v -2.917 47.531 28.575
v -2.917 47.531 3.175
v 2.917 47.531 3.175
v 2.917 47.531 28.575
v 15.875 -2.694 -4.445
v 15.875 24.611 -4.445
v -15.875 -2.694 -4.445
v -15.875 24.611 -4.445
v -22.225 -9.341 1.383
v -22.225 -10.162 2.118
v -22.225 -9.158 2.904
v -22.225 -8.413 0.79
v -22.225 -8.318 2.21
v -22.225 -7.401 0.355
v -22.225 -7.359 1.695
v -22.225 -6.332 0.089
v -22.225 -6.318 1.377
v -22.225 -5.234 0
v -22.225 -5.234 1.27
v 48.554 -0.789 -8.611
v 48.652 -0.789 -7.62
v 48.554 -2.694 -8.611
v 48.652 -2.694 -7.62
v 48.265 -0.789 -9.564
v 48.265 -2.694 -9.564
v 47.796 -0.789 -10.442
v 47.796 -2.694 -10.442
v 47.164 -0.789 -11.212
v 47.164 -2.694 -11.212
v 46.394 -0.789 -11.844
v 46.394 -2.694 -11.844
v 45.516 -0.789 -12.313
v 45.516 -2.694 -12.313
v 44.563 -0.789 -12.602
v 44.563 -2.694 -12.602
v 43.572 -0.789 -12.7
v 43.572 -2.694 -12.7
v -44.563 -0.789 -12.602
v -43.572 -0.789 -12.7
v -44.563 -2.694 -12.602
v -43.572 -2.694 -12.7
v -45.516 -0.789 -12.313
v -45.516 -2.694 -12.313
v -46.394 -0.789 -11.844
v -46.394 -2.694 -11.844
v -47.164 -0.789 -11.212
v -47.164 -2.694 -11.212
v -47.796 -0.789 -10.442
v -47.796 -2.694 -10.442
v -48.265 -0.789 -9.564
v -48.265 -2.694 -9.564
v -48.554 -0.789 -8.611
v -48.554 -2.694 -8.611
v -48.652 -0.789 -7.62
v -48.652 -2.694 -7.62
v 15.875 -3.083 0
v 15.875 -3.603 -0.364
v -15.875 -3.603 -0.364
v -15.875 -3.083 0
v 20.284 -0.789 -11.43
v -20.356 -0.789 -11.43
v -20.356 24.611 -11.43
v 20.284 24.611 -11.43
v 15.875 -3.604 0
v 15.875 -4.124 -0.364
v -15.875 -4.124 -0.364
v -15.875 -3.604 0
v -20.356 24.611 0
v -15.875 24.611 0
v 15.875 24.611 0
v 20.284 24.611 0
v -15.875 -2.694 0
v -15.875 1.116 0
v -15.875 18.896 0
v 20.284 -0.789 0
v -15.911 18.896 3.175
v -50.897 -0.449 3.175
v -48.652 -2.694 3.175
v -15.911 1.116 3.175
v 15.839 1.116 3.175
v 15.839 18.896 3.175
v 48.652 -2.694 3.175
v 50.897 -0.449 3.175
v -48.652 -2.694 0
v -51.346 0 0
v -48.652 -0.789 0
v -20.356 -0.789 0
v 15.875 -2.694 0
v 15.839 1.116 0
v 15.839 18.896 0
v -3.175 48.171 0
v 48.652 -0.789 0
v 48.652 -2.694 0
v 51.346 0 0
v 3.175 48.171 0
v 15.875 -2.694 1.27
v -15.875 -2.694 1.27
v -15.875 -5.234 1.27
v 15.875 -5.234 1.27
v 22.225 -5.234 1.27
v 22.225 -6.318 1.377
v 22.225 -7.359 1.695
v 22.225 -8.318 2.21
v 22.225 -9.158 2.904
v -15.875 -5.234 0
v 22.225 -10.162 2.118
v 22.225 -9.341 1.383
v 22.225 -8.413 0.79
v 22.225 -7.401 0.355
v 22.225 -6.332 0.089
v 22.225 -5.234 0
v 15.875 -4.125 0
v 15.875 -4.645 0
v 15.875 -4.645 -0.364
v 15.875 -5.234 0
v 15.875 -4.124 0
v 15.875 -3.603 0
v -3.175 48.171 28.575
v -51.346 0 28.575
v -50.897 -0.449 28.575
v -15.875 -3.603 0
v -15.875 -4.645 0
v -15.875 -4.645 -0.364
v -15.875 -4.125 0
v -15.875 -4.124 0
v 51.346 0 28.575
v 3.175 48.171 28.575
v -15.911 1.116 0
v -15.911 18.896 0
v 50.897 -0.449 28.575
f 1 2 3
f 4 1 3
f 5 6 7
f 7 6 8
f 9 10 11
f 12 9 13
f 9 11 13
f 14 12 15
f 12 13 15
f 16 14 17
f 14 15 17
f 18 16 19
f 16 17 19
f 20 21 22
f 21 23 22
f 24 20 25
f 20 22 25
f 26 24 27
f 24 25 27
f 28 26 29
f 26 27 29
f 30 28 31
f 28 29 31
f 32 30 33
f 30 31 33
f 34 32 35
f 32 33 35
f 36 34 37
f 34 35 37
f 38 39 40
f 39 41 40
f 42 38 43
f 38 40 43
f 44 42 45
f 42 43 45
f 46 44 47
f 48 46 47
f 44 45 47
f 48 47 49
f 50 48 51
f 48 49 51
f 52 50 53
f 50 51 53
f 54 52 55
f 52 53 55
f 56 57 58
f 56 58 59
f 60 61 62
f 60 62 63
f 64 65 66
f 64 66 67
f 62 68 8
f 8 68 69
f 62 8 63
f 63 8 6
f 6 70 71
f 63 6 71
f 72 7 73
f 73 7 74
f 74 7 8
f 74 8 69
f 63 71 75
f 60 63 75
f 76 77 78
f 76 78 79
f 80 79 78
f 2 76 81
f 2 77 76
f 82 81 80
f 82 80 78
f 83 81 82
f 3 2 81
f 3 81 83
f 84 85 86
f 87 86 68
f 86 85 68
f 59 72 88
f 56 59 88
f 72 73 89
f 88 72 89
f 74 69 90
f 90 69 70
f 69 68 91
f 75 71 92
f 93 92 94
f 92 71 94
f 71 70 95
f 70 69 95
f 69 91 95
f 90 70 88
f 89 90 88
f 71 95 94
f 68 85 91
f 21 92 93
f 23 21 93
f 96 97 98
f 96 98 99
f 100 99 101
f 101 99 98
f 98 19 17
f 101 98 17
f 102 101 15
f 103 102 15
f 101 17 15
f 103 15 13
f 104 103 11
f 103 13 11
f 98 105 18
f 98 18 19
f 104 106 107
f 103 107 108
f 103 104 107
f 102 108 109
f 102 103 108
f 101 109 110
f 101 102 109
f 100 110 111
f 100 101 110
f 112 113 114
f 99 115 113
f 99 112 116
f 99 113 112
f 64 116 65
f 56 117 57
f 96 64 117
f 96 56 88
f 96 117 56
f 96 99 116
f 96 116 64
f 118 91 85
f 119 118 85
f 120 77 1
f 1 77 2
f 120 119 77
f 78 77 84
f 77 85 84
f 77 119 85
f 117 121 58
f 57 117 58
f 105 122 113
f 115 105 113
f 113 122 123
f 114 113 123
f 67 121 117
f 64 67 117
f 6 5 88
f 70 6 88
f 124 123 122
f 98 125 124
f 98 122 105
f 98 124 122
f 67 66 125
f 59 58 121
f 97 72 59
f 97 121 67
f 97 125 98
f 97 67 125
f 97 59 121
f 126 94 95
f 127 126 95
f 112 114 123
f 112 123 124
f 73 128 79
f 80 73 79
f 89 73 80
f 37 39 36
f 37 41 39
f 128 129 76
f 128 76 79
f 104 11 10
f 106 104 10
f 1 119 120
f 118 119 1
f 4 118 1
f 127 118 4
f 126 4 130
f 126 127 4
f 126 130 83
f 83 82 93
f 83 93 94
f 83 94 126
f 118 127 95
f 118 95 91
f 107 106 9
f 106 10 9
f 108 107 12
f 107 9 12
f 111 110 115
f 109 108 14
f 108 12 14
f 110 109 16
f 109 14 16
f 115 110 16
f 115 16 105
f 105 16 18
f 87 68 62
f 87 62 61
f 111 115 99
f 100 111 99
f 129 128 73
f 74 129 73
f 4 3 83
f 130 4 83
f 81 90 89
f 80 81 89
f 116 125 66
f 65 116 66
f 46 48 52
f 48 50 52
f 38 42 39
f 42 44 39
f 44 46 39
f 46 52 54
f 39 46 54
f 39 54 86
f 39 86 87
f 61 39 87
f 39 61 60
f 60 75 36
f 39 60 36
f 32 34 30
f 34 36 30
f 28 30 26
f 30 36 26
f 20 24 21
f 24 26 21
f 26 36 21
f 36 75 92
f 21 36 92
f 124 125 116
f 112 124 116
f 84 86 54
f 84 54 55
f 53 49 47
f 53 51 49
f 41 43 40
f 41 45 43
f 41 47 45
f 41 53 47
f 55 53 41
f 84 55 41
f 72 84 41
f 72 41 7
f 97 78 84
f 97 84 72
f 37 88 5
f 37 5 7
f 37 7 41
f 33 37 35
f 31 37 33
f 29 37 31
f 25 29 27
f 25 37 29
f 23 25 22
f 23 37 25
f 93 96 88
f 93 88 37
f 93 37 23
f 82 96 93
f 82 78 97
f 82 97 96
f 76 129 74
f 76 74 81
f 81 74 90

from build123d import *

# Parameters (mm, degrees)
F1_DEPTH         = 3.175
F3_DEPTH         = 25.4
F4_W             = 97.3040463274
F4_H             = 1.905
F5_DEPTH         = 12.7
F6_W             = 40.64
F6_H             = 25.4
F7_DEPTH         = 11.43
F8_W             = 31.75
F8_H             = 17.78
F9_DEPTH         = 3.175
F10_W            = 31.75
F10_H            = 4.445
F11_DEPTH        = 27.305
F12_W            = 31.75
F12_H            = 1.27
F13_DEPTH        = 2.54
F15_DEPTH        = 31.75
F15_COPIES_COUNT = 3
F15_COPIES_PITCH = 0.5207
F17_DEPTH        = 38.1
F18_DEPTH        = 6.35
F19_R            = 5.08


# Not quite as in the source:
# - a pattern or mirror of a feature is missing from the dataset's text; its kind, count and spacing are read off the source's solid


with BuildPart() as f1:
    # F0 (on Top) → F1 (new body)
    with BuildSketch(Plane.XY):
        Polygon((3.175, 48.1711), (-3.175, 48.1711), (-51.3461, 0), (-48.6520231637, -2.6940768363), (48.6520231637, -2.6940768363), (51.3461, 0), align=None)
    extrude(amount=F1_DEPTH)

    # F2 (on face) → F3 (join)
    with BuildSketch(Plane.XY.offset(3.175)):
        Polygon((-3.175, 48.1711), (-51.3461, 0), (-50.8970871939, -0.4490128061), (-2.916877582, 47.5311968059), (2.916871896, 47.5312024919), (50.8970871939, -0.4490128061), (51.3461, 0), (3.175, 48.1711), align=None)
    extrude(amount=F3_DEPTH)

    # F4 (on face) → F5 (join)
    with BuildSketch(Plane(origin=(0, 0, 0), x_dir=(1, 0, 0), z_dir=(0, 0, -1))):
        with Locations((0, 1.7415768363)):
            Rectangle(F4_W, F4_H)
    extrude(amount=F5_DEPTH)

    # F6 (on face) → F7 (join)
    with BuildSketch(Plane(origin=(0, 0, 0), x_dir=(1, 0, 0), z_dir=(0, 0, -1))):
        with Locations((-0.0357092768, -11.9109231637)):
            Rectangle(F6_W, F6_H)
    extrude(amount=F7_DEPTH)

    # F8 (on face) → F9 (cut, through all)
    with BuildSketch(Plane(origin=(0, 0, 0), x_dir=(1, 0, 0), z_dir=(0, 0, -1))):
        with Locations((-0.0357092768, -10.0059231637)):
            Rectangle(F8_W, F8_H)
    extrude(amount=-F9_DEPTH, mode=Mode.SUBTRACT)

    # F10 (on face) → F11 (cut, through all)
    with BuildSketch(Plane(origin=(0, 24.6109231637, 0), x_dir=(-1, 0, 0), z_dir=(0, 1, 0))):
        with Locations((-7.74733e-05, -2.2225)):
            Rectangle(F10_W, F10_H)
    extrude(amount=-F11_DEPTH, mode=Mode.SUBTRACT)

    # F12 (on face) → F13 (join)
    with BuildSketch(Plane.XZ.offset(2.6940768363)):
        with Locations((7.74733e-05, 0.635)):
            Rectangle(F12_W, F12_H)
    extrude(amount=F13_DEPTH)

    # F14 (on face) → F15 (join, through all)
    with BuildSketch(Plane.YZ.offset(15.8750774733)):
        Polygon((-3.6032828125, -0.3642210371), (-3.0831212644, 0), (-3.6032828125, 0), align=None)
    f15 = extrude(amount=-F15_DEPTH)

    # F15_copies: F15 ×3
    with Locations(*[(0, -i * F15_COPIES_PITCH, 0) for i in range(1, F15_COPIES_COUNT)]):
        add(f15)

    # F16 (on face) → F17 (join)
    with BuildSketch(Plane.YZ.offset(15.8750774733)):
        with BuildLine():
            Line((-9.1575253509, 2.9035897025), (-10.161578661, 2.1184348754))
            ThreePointArc((-10.161578661, 2.1184348754), (-7.9158691733, 0.5520507884), (-5.2340768363, 0))
            Line((-5.2340768363, 0), (-5.2340768363, 1.27))
            ThreePointArc((-5.2340768363, 1.27), (-7.3590511634, 1.6947115498), (-9.1575253509, 2.9035897025))
        make_face()
    extrude(amount=-F17_DEPTH)

    # F16 (on face) → F18 (join)
    with BuildSketch(Plane.YZ.offset(15.8750774733)):
        with BuildLine():
            Line((-9.1575253509, 2.9035897025), (-10.161578661, 2.1184348754))
            ThreePointArc((-10.161578661, 2.1184348754), (-7.9158691733, 0.5520507884), (-5.2340768363, 0))
            Line((-5.2340768363, 0), (-5.2340768363, 1.27))
            ThreePointArc((-5.2340768363, 1.27), (-7.3590511634, 1.6947115498), (-9.1575253509, 2.9035897025))
        make_face()
    extrude(amount=F18_DEPTH)

    # F19
    f19_edges = [f1.edges().sort_by_distance(p)[0] for p in [
        (-48.652023, -1.741577, -12.7),
        (48.652023, -1.741577, -12.7),
    ]]
    fillet(f19_edges, radius=F19_R)


solid = f1.part
